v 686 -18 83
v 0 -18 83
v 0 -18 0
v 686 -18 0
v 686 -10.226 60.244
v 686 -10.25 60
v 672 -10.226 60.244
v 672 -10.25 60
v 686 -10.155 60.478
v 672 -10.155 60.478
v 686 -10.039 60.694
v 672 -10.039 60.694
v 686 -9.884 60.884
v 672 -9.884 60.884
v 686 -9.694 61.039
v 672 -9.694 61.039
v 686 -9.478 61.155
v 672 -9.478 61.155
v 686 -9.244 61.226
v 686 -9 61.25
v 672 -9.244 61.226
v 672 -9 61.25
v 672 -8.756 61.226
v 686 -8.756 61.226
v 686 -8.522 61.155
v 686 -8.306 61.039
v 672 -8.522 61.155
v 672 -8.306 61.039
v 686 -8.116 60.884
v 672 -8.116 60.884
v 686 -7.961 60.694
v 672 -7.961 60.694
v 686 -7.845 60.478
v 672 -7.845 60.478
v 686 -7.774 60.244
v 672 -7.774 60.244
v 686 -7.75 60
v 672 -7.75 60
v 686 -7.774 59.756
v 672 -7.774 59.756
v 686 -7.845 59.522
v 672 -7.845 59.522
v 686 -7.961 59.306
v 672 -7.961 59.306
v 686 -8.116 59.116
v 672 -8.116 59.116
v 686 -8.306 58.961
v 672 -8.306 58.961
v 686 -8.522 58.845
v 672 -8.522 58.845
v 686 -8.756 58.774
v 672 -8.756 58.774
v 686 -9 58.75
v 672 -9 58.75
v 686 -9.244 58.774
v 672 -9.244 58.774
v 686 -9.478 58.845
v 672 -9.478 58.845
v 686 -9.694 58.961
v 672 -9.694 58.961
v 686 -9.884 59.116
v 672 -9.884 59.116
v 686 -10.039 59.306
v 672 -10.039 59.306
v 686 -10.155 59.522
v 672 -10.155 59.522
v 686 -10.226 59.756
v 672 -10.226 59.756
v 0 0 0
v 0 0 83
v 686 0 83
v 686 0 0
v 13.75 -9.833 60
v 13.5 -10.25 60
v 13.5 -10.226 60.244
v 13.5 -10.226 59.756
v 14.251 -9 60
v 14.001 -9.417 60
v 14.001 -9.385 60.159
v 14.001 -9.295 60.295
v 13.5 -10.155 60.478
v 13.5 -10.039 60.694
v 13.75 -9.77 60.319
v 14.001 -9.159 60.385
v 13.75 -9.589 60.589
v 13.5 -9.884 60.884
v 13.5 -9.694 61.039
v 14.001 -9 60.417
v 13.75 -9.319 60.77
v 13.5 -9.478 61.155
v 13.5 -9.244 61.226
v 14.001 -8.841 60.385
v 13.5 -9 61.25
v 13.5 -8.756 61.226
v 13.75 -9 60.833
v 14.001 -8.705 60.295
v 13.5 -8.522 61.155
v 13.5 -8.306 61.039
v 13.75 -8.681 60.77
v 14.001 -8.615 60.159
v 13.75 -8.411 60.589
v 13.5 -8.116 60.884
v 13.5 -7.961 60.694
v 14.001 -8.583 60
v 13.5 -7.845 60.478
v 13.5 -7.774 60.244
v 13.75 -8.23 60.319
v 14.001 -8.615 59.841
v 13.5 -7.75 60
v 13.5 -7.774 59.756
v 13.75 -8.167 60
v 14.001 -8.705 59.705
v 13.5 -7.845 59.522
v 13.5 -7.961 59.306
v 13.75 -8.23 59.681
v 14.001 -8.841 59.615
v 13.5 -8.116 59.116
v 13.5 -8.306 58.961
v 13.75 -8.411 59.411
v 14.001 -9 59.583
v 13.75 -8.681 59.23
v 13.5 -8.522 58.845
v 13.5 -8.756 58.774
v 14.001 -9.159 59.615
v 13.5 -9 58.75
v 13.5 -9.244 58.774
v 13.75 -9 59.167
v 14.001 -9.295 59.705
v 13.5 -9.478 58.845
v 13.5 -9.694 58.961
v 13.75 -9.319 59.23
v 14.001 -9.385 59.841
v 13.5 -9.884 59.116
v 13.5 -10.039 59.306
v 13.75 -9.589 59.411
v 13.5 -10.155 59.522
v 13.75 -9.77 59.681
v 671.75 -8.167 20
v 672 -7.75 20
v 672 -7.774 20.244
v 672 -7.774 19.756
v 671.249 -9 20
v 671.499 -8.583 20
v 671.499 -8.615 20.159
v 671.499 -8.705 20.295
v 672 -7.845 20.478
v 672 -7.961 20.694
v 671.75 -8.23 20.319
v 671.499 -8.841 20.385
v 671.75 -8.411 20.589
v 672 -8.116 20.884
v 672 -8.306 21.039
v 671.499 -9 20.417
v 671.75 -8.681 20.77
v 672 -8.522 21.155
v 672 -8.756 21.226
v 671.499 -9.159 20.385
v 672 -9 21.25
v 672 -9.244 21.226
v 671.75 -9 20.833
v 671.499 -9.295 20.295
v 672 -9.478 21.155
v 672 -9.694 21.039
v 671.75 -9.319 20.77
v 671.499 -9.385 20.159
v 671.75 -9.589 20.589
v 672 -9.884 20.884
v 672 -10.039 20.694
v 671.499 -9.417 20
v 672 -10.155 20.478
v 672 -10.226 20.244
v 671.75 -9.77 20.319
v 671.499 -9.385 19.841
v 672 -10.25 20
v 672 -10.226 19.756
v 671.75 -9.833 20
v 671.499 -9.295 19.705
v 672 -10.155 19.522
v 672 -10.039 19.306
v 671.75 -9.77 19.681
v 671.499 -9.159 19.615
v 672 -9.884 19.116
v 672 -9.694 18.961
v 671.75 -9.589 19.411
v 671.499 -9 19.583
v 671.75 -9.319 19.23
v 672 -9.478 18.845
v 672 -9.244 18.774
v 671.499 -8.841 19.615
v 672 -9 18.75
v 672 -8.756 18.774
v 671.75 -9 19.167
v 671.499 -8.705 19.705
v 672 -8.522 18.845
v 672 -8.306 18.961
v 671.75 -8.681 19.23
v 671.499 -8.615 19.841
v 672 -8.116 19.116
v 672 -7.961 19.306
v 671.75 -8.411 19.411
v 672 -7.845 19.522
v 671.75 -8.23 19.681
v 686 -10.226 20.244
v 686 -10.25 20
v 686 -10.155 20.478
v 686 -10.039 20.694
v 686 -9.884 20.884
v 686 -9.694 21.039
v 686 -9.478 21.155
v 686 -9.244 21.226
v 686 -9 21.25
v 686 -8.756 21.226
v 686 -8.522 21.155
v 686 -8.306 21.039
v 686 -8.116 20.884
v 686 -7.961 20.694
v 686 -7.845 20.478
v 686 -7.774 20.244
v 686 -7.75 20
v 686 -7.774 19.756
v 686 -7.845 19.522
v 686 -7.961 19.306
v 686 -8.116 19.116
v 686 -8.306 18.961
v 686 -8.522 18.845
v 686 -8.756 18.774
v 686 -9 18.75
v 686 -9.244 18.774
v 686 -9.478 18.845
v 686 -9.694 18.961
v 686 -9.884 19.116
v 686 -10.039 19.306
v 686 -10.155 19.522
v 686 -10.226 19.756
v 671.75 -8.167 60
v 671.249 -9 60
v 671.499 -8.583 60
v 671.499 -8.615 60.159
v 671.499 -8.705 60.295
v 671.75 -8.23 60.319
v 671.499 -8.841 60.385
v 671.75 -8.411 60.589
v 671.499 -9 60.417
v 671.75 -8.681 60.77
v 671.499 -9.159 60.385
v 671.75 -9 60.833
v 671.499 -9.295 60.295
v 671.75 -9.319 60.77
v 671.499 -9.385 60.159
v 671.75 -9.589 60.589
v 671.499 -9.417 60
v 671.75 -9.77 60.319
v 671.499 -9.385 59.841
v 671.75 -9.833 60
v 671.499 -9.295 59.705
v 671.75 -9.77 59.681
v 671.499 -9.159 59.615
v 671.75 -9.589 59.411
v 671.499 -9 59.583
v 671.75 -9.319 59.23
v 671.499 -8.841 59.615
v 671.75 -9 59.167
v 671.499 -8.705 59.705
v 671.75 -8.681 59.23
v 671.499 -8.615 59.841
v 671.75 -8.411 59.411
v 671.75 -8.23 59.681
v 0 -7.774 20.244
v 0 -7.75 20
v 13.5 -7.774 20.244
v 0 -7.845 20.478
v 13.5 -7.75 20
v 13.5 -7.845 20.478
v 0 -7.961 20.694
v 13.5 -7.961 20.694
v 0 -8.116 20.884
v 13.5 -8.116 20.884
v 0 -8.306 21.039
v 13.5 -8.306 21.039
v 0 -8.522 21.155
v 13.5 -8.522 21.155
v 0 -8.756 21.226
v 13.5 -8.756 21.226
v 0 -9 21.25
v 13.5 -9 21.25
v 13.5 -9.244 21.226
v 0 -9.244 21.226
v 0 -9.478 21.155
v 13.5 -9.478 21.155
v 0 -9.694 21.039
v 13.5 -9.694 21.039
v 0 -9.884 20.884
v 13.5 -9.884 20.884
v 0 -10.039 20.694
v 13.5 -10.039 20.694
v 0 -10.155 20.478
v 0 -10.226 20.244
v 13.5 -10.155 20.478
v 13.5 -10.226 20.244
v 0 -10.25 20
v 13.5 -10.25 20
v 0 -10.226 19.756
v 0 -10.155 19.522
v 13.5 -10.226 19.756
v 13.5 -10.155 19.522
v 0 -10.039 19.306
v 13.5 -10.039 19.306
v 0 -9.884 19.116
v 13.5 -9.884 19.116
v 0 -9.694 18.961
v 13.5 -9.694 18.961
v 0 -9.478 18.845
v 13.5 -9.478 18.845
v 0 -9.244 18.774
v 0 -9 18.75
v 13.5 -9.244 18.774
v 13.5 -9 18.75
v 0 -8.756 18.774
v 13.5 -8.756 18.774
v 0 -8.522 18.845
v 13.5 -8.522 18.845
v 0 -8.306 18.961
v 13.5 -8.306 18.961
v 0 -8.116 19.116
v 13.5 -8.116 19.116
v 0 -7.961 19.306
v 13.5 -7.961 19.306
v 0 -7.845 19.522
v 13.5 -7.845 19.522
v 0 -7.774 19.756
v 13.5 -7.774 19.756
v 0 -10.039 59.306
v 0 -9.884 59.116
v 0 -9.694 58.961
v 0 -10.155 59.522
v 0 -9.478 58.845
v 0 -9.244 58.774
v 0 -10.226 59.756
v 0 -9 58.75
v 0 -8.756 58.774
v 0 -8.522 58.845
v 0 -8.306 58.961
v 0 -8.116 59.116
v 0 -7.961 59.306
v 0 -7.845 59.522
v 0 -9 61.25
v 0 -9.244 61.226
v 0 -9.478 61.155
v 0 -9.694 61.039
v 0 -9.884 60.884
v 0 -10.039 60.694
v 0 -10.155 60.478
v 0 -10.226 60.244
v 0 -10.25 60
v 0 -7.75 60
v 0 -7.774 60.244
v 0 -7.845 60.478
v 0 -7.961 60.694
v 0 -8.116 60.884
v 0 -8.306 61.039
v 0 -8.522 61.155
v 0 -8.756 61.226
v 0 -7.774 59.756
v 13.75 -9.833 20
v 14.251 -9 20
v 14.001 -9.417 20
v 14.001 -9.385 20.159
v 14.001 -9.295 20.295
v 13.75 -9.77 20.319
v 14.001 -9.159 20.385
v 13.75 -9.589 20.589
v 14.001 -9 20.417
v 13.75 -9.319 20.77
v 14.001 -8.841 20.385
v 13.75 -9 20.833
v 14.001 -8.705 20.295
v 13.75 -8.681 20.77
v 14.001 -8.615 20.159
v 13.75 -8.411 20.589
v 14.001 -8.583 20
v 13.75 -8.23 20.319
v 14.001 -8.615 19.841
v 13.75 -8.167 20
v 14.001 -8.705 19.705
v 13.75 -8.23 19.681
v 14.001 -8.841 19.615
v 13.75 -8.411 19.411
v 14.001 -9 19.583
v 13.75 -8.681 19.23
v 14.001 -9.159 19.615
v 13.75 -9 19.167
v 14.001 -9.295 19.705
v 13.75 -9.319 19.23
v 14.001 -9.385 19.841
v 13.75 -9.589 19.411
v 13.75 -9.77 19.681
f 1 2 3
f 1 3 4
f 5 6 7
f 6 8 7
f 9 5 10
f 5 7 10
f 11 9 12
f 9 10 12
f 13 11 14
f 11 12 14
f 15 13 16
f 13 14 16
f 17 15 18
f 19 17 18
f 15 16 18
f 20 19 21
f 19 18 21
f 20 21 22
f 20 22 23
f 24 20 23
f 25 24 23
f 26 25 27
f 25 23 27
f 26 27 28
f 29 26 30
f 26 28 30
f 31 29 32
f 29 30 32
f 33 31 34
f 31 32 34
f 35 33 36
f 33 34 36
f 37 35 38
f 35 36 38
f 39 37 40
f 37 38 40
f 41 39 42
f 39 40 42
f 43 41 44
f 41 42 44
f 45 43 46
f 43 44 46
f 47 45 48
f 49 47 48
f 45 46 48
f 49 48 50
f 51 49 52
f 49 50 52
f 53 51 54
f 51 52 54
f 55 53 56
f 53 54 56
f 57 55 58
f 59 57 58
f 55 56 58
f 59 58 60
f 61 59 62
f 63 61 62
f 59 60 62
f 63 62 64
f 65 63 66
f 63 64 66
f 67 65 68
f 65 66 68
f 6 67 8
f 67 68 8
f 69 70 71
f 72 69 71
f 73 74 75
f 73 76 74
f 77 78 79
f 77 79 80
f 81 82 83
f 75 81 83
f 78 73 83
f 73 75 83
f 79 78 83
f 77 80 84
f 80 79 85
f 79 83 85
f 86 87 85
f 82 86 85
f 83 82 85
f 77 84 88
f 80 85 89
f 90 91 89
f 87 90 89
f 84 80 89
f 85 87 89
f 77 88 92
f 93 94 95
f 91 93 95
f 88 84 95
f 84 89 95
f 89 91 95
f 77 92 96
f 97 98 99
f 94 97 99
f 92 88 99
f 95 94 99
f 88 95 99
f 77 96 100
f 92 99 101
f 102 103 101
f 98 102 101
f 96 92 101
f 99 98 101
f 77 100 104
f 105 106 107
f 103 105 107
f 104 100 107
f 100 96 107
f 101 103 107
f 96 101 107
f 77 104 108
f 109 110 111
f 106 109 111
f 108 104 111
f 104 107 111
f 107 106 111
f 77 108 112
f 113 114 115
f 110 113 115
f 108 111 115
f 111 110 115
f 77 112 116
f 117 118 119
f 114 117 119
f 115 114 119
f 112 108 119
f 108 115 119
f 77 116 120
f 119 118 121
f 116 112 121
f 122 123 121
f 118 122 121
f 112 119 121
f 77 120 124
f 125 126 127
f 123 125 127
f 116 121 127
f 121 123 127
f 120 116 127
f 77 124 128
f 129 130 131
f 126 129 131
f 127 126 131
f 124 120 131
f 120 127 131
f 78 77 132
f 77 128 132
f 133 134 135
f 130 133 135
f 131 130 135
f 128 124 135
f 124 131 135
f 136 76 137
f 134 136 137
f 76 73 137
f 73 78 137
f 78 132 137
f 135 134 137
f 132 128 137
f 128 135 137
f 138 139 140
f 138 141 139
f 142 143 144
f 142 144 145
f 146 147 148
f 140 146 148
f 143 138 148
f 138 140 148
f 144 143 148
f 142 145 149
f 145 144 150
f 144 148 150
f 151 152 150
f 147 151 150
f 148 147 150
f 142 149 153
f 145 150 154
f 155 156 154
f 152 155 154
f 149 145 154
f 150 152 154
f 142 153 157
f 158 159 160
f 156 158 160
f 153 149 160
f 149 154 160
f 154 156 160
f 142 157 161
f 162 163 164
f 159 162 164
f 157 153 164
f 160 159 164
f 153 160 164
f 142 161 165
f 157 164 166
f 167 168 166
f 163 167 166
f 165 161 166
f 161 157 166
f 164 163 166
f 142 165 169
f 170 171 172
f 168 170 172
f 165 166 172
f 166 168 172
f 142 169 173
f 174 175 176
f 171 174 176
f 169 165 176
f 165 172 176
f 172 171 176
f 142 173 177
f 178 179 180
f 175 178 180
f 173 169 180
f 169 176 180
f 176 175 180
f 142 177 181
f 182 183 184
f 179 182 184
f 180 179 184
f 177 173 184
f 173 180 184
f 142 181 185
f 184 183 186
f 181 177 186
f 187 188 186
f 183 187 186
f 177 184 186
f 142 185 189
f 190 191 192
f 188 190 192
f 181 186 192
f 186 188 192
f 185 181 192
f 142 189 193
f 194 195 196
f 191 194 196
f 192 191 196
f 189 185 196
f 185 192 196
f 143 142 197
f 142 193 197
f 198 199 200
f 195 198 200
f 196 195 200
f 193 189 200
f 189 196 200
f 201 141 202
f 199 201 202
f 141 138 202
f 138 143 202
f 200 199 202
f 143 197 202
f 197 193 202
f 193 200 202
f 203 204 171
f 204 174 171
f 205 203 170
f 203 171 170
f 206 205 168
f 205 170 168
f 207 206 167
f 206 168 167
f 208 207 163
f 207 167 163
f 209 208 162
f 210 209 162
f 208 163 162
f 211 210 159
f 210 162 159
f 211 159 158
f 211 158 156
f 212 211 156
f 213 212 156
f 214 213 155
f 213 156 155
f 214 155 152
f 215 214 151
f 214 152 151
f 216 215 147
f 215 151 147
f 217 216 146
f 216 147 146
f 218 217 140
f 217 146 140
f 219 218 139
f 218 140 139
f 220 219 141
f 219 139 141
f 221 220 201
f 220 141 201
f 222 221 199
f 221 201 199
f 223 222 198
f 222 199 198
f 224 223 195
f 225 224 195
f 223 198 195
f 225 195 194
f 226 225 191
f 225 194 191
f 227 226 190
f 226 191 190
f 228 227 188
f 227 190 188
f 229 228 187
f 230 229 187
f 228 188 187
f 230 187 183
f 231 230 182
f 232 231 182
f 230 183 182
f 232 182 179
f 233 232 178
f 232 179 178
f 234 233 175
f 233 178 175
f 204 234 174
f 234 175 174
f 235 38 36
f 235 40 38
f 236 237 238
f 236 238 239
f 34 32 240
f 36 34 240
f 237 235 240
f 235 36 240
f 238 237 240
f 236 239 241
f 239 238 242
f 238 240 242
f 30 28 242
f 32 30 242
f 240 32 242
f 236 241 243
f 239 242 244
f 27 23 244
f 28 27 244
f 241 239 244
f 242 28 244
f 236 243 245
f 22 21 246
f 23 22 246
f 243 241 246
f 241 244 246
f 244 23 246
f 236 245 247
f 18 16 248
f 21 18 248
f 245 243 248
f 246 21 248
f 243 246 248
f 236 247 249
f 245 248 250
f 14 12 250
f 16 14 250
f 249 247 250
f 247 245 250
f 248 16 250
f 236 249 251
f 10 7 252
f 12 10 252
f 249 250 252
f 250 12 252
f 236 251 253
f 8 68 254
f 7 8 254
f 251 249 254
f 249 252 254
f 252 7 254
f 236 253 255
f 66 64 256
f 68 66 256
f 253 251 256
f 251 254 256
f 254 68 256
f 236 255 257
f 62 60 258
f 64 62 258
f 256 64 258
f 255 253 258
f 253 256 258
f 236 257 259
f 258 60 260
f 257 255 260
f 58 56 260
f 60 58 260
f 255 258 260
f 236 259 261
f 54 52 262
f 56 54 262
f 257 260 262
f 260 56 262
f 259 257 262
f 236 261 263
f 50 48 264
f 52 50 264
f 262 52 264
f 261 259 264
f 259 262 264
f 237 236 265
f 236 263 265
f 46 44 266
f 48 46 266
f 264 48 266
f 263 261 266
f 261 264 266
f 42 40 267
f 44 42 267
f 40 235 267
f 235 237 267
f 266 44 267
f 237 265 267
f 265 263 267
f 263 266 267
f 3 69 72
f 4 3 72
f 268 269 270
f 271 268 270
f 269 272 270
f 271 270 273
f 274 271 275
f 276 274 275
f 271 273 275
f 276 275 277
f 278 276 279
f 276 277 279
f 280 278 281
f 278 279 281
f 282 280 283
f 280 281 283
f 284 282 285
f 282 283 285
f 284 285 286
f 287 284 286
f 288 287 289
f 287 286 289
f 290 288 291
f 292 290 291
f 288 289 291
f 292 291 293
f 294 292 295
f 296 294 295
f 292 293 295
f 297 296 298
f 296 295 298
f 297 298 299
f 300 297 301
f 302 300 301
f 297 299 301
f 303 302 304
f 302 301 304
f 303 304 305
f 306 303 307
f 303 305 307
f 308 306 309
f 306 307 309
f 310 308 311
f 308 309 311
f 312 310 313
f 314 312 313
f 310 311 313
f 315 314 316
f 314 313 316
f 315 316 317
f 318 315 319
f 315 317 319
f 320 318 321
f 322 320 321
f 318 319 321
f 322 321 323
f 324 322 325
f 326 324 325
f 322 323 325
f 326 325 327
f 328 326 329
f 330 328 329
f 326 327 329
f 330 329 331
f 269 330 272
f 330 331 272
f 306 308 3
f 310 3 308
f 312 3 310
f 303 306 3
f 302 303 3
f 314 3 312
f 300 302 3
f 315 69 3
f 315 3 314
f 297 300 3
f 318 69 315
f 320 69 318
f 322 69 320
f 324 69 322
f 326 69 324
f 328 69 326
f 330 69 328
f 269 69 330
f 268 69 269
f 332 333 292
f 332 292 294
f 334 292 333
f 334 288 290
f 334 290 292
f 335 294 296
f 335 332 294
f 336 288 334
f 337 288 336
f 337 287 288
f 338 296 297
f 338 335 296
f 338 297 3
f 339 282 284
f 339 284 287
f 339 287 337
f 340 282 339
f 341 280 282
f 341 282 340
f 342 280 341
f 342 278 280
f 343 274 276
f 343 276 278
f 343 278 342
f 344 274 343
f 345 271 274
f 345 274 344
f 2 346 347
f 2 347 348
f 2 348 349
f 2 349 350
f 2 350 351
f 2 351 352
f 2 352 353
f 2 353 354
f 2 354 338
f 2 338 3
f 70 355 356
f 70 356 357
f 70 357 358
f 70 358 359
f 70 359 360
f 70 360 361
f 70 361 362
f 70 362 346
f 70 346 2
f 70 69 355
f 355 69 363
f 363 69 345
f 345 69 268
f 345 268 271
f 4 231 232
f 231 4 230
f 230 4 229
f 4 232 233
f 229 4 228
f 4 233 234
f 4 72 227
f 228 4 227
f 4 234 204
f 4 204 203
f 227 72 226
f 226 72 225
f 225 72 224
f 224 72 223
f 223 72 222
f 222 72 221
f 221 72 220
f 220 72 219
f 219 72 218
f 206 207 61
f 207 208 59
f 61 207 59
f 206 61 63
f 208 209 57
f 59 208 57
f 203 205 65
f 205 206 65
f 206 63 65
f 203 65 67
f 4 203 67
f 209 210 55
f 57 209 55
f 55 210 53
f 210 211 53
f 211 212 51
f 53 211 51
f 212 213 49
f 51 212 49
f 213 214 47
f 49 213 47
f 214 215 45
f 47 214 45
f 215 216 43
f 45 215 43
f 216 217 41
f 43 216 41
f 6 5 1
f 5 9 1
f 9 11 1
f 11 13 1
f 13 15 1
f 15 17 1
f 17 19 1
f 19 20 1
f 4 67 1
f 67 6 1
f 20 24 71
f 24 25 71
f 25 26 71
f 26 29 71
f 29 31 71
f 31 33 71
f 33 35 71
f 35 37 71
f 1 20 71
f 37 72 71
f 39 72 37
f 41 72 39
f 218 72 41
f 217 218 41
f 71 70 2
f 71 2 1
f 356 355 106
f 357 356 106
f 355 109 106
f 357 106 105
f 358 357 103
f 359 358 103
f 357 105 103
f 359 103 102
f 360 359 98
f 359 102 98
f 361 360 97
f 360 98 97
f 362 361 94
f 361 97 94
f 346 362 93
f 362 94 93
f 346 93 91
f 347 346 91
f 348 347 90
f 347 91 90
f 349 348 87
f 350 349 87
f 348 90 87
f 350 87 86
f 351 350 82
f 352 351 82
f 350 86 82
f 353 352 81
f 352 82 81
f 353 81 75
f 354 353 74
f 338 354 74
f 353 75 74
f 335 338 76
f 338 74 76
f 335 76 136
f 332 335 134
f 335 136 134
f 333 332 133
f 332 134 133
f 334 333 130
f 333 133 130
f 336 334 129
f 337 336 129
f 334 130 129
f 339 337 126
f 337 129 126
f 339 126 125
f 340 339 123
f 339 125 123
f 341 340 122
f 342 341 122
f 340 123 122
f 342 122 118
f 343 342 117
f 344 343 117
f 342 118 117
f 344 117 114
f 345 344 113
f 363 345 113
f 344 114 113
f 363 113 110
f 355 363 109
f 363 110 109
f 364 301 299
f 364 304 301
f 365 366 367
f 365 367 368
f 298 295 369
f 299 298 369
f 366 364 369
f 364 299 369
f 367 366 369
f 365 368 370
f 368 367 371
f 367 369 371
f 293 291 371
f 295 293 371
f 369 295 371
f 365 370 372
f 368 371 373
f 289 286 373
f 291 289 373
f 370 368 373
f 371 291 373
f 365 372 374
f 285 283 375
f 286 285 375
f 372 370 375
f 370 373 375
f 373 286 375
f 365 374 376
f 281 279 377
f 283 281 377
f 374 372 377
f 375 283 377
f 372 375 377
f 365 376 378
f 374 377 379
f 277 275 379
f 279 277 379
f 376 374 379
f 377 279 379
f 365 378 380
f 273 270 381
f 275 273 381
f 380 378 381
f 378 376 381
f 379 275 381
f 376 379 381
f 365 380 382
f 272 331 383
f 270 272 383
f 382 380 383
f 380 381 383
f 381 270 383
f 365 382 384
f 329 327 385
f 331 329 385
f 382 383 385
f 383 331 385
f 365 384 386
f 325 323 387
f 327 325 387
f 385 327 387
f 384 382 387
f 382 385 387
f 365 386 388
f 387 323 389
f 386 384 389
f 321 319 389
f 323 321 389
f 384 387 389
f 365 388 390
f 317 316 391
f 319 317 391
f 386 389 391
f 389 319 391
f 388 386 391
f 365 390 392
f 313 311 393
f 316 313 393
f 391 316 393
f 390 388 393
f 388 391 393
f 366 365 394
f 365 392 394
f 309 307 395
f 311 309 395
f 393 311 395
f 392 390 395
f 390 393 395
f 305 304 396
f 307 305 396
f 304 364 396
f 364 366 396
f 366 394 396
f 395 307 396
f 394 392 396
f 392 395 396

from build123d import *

# Parameters (mm, degrees)
F0_W     = 686
F0_H     = 83
F1_DEPTH = 18
F3_D     = 2.5
F3_DEPTH = 13.5
F3_TIP   = 0.7510757738
F5_D     = 2.5
F5_DEPTH = 14
F5_TIP   = 0.7510757738


with BuildPart() as f1:
    # F0 (on Front) → F1 (new body)
    with BuildSketch(Plane.XZ):
        with Locations((343, 41.5)):
            Rectangle(F0_W, F0_H)
    extrude(amount=F1_DEPTH)

    # F3
    with Locations(Plane(origin=(0, 0, 0), x_dir=(0, -1, 0), z_dir=(-1, 0, 0))):
        with Locations((9, 20), (9, 60)):
            Hole(F3_D / 2, depth=F3_DEPTH)
            with Locations((0, 0, -(F3_DEPTH + F3_TIP / 2))):  # 118° drill point
                Cone(0, F3_D / 2, F3_TIP, mode=Mode.SUBTRACT)

    # F5
    with Locations(Plane.YZ.offset(686)):
        with Locations((-9, 20), (-9, 60)):
            Hole(F5_D / 2, depth=F5_DEPTH)
            with Locations((0, 0, -(F5_DEPTH + F5_TIP / 2))):  # 118° drill point
                Cone(0, F5_D / 2, F5_TIP, mode=Mode.SUBTRACT)


solid = f1.part
